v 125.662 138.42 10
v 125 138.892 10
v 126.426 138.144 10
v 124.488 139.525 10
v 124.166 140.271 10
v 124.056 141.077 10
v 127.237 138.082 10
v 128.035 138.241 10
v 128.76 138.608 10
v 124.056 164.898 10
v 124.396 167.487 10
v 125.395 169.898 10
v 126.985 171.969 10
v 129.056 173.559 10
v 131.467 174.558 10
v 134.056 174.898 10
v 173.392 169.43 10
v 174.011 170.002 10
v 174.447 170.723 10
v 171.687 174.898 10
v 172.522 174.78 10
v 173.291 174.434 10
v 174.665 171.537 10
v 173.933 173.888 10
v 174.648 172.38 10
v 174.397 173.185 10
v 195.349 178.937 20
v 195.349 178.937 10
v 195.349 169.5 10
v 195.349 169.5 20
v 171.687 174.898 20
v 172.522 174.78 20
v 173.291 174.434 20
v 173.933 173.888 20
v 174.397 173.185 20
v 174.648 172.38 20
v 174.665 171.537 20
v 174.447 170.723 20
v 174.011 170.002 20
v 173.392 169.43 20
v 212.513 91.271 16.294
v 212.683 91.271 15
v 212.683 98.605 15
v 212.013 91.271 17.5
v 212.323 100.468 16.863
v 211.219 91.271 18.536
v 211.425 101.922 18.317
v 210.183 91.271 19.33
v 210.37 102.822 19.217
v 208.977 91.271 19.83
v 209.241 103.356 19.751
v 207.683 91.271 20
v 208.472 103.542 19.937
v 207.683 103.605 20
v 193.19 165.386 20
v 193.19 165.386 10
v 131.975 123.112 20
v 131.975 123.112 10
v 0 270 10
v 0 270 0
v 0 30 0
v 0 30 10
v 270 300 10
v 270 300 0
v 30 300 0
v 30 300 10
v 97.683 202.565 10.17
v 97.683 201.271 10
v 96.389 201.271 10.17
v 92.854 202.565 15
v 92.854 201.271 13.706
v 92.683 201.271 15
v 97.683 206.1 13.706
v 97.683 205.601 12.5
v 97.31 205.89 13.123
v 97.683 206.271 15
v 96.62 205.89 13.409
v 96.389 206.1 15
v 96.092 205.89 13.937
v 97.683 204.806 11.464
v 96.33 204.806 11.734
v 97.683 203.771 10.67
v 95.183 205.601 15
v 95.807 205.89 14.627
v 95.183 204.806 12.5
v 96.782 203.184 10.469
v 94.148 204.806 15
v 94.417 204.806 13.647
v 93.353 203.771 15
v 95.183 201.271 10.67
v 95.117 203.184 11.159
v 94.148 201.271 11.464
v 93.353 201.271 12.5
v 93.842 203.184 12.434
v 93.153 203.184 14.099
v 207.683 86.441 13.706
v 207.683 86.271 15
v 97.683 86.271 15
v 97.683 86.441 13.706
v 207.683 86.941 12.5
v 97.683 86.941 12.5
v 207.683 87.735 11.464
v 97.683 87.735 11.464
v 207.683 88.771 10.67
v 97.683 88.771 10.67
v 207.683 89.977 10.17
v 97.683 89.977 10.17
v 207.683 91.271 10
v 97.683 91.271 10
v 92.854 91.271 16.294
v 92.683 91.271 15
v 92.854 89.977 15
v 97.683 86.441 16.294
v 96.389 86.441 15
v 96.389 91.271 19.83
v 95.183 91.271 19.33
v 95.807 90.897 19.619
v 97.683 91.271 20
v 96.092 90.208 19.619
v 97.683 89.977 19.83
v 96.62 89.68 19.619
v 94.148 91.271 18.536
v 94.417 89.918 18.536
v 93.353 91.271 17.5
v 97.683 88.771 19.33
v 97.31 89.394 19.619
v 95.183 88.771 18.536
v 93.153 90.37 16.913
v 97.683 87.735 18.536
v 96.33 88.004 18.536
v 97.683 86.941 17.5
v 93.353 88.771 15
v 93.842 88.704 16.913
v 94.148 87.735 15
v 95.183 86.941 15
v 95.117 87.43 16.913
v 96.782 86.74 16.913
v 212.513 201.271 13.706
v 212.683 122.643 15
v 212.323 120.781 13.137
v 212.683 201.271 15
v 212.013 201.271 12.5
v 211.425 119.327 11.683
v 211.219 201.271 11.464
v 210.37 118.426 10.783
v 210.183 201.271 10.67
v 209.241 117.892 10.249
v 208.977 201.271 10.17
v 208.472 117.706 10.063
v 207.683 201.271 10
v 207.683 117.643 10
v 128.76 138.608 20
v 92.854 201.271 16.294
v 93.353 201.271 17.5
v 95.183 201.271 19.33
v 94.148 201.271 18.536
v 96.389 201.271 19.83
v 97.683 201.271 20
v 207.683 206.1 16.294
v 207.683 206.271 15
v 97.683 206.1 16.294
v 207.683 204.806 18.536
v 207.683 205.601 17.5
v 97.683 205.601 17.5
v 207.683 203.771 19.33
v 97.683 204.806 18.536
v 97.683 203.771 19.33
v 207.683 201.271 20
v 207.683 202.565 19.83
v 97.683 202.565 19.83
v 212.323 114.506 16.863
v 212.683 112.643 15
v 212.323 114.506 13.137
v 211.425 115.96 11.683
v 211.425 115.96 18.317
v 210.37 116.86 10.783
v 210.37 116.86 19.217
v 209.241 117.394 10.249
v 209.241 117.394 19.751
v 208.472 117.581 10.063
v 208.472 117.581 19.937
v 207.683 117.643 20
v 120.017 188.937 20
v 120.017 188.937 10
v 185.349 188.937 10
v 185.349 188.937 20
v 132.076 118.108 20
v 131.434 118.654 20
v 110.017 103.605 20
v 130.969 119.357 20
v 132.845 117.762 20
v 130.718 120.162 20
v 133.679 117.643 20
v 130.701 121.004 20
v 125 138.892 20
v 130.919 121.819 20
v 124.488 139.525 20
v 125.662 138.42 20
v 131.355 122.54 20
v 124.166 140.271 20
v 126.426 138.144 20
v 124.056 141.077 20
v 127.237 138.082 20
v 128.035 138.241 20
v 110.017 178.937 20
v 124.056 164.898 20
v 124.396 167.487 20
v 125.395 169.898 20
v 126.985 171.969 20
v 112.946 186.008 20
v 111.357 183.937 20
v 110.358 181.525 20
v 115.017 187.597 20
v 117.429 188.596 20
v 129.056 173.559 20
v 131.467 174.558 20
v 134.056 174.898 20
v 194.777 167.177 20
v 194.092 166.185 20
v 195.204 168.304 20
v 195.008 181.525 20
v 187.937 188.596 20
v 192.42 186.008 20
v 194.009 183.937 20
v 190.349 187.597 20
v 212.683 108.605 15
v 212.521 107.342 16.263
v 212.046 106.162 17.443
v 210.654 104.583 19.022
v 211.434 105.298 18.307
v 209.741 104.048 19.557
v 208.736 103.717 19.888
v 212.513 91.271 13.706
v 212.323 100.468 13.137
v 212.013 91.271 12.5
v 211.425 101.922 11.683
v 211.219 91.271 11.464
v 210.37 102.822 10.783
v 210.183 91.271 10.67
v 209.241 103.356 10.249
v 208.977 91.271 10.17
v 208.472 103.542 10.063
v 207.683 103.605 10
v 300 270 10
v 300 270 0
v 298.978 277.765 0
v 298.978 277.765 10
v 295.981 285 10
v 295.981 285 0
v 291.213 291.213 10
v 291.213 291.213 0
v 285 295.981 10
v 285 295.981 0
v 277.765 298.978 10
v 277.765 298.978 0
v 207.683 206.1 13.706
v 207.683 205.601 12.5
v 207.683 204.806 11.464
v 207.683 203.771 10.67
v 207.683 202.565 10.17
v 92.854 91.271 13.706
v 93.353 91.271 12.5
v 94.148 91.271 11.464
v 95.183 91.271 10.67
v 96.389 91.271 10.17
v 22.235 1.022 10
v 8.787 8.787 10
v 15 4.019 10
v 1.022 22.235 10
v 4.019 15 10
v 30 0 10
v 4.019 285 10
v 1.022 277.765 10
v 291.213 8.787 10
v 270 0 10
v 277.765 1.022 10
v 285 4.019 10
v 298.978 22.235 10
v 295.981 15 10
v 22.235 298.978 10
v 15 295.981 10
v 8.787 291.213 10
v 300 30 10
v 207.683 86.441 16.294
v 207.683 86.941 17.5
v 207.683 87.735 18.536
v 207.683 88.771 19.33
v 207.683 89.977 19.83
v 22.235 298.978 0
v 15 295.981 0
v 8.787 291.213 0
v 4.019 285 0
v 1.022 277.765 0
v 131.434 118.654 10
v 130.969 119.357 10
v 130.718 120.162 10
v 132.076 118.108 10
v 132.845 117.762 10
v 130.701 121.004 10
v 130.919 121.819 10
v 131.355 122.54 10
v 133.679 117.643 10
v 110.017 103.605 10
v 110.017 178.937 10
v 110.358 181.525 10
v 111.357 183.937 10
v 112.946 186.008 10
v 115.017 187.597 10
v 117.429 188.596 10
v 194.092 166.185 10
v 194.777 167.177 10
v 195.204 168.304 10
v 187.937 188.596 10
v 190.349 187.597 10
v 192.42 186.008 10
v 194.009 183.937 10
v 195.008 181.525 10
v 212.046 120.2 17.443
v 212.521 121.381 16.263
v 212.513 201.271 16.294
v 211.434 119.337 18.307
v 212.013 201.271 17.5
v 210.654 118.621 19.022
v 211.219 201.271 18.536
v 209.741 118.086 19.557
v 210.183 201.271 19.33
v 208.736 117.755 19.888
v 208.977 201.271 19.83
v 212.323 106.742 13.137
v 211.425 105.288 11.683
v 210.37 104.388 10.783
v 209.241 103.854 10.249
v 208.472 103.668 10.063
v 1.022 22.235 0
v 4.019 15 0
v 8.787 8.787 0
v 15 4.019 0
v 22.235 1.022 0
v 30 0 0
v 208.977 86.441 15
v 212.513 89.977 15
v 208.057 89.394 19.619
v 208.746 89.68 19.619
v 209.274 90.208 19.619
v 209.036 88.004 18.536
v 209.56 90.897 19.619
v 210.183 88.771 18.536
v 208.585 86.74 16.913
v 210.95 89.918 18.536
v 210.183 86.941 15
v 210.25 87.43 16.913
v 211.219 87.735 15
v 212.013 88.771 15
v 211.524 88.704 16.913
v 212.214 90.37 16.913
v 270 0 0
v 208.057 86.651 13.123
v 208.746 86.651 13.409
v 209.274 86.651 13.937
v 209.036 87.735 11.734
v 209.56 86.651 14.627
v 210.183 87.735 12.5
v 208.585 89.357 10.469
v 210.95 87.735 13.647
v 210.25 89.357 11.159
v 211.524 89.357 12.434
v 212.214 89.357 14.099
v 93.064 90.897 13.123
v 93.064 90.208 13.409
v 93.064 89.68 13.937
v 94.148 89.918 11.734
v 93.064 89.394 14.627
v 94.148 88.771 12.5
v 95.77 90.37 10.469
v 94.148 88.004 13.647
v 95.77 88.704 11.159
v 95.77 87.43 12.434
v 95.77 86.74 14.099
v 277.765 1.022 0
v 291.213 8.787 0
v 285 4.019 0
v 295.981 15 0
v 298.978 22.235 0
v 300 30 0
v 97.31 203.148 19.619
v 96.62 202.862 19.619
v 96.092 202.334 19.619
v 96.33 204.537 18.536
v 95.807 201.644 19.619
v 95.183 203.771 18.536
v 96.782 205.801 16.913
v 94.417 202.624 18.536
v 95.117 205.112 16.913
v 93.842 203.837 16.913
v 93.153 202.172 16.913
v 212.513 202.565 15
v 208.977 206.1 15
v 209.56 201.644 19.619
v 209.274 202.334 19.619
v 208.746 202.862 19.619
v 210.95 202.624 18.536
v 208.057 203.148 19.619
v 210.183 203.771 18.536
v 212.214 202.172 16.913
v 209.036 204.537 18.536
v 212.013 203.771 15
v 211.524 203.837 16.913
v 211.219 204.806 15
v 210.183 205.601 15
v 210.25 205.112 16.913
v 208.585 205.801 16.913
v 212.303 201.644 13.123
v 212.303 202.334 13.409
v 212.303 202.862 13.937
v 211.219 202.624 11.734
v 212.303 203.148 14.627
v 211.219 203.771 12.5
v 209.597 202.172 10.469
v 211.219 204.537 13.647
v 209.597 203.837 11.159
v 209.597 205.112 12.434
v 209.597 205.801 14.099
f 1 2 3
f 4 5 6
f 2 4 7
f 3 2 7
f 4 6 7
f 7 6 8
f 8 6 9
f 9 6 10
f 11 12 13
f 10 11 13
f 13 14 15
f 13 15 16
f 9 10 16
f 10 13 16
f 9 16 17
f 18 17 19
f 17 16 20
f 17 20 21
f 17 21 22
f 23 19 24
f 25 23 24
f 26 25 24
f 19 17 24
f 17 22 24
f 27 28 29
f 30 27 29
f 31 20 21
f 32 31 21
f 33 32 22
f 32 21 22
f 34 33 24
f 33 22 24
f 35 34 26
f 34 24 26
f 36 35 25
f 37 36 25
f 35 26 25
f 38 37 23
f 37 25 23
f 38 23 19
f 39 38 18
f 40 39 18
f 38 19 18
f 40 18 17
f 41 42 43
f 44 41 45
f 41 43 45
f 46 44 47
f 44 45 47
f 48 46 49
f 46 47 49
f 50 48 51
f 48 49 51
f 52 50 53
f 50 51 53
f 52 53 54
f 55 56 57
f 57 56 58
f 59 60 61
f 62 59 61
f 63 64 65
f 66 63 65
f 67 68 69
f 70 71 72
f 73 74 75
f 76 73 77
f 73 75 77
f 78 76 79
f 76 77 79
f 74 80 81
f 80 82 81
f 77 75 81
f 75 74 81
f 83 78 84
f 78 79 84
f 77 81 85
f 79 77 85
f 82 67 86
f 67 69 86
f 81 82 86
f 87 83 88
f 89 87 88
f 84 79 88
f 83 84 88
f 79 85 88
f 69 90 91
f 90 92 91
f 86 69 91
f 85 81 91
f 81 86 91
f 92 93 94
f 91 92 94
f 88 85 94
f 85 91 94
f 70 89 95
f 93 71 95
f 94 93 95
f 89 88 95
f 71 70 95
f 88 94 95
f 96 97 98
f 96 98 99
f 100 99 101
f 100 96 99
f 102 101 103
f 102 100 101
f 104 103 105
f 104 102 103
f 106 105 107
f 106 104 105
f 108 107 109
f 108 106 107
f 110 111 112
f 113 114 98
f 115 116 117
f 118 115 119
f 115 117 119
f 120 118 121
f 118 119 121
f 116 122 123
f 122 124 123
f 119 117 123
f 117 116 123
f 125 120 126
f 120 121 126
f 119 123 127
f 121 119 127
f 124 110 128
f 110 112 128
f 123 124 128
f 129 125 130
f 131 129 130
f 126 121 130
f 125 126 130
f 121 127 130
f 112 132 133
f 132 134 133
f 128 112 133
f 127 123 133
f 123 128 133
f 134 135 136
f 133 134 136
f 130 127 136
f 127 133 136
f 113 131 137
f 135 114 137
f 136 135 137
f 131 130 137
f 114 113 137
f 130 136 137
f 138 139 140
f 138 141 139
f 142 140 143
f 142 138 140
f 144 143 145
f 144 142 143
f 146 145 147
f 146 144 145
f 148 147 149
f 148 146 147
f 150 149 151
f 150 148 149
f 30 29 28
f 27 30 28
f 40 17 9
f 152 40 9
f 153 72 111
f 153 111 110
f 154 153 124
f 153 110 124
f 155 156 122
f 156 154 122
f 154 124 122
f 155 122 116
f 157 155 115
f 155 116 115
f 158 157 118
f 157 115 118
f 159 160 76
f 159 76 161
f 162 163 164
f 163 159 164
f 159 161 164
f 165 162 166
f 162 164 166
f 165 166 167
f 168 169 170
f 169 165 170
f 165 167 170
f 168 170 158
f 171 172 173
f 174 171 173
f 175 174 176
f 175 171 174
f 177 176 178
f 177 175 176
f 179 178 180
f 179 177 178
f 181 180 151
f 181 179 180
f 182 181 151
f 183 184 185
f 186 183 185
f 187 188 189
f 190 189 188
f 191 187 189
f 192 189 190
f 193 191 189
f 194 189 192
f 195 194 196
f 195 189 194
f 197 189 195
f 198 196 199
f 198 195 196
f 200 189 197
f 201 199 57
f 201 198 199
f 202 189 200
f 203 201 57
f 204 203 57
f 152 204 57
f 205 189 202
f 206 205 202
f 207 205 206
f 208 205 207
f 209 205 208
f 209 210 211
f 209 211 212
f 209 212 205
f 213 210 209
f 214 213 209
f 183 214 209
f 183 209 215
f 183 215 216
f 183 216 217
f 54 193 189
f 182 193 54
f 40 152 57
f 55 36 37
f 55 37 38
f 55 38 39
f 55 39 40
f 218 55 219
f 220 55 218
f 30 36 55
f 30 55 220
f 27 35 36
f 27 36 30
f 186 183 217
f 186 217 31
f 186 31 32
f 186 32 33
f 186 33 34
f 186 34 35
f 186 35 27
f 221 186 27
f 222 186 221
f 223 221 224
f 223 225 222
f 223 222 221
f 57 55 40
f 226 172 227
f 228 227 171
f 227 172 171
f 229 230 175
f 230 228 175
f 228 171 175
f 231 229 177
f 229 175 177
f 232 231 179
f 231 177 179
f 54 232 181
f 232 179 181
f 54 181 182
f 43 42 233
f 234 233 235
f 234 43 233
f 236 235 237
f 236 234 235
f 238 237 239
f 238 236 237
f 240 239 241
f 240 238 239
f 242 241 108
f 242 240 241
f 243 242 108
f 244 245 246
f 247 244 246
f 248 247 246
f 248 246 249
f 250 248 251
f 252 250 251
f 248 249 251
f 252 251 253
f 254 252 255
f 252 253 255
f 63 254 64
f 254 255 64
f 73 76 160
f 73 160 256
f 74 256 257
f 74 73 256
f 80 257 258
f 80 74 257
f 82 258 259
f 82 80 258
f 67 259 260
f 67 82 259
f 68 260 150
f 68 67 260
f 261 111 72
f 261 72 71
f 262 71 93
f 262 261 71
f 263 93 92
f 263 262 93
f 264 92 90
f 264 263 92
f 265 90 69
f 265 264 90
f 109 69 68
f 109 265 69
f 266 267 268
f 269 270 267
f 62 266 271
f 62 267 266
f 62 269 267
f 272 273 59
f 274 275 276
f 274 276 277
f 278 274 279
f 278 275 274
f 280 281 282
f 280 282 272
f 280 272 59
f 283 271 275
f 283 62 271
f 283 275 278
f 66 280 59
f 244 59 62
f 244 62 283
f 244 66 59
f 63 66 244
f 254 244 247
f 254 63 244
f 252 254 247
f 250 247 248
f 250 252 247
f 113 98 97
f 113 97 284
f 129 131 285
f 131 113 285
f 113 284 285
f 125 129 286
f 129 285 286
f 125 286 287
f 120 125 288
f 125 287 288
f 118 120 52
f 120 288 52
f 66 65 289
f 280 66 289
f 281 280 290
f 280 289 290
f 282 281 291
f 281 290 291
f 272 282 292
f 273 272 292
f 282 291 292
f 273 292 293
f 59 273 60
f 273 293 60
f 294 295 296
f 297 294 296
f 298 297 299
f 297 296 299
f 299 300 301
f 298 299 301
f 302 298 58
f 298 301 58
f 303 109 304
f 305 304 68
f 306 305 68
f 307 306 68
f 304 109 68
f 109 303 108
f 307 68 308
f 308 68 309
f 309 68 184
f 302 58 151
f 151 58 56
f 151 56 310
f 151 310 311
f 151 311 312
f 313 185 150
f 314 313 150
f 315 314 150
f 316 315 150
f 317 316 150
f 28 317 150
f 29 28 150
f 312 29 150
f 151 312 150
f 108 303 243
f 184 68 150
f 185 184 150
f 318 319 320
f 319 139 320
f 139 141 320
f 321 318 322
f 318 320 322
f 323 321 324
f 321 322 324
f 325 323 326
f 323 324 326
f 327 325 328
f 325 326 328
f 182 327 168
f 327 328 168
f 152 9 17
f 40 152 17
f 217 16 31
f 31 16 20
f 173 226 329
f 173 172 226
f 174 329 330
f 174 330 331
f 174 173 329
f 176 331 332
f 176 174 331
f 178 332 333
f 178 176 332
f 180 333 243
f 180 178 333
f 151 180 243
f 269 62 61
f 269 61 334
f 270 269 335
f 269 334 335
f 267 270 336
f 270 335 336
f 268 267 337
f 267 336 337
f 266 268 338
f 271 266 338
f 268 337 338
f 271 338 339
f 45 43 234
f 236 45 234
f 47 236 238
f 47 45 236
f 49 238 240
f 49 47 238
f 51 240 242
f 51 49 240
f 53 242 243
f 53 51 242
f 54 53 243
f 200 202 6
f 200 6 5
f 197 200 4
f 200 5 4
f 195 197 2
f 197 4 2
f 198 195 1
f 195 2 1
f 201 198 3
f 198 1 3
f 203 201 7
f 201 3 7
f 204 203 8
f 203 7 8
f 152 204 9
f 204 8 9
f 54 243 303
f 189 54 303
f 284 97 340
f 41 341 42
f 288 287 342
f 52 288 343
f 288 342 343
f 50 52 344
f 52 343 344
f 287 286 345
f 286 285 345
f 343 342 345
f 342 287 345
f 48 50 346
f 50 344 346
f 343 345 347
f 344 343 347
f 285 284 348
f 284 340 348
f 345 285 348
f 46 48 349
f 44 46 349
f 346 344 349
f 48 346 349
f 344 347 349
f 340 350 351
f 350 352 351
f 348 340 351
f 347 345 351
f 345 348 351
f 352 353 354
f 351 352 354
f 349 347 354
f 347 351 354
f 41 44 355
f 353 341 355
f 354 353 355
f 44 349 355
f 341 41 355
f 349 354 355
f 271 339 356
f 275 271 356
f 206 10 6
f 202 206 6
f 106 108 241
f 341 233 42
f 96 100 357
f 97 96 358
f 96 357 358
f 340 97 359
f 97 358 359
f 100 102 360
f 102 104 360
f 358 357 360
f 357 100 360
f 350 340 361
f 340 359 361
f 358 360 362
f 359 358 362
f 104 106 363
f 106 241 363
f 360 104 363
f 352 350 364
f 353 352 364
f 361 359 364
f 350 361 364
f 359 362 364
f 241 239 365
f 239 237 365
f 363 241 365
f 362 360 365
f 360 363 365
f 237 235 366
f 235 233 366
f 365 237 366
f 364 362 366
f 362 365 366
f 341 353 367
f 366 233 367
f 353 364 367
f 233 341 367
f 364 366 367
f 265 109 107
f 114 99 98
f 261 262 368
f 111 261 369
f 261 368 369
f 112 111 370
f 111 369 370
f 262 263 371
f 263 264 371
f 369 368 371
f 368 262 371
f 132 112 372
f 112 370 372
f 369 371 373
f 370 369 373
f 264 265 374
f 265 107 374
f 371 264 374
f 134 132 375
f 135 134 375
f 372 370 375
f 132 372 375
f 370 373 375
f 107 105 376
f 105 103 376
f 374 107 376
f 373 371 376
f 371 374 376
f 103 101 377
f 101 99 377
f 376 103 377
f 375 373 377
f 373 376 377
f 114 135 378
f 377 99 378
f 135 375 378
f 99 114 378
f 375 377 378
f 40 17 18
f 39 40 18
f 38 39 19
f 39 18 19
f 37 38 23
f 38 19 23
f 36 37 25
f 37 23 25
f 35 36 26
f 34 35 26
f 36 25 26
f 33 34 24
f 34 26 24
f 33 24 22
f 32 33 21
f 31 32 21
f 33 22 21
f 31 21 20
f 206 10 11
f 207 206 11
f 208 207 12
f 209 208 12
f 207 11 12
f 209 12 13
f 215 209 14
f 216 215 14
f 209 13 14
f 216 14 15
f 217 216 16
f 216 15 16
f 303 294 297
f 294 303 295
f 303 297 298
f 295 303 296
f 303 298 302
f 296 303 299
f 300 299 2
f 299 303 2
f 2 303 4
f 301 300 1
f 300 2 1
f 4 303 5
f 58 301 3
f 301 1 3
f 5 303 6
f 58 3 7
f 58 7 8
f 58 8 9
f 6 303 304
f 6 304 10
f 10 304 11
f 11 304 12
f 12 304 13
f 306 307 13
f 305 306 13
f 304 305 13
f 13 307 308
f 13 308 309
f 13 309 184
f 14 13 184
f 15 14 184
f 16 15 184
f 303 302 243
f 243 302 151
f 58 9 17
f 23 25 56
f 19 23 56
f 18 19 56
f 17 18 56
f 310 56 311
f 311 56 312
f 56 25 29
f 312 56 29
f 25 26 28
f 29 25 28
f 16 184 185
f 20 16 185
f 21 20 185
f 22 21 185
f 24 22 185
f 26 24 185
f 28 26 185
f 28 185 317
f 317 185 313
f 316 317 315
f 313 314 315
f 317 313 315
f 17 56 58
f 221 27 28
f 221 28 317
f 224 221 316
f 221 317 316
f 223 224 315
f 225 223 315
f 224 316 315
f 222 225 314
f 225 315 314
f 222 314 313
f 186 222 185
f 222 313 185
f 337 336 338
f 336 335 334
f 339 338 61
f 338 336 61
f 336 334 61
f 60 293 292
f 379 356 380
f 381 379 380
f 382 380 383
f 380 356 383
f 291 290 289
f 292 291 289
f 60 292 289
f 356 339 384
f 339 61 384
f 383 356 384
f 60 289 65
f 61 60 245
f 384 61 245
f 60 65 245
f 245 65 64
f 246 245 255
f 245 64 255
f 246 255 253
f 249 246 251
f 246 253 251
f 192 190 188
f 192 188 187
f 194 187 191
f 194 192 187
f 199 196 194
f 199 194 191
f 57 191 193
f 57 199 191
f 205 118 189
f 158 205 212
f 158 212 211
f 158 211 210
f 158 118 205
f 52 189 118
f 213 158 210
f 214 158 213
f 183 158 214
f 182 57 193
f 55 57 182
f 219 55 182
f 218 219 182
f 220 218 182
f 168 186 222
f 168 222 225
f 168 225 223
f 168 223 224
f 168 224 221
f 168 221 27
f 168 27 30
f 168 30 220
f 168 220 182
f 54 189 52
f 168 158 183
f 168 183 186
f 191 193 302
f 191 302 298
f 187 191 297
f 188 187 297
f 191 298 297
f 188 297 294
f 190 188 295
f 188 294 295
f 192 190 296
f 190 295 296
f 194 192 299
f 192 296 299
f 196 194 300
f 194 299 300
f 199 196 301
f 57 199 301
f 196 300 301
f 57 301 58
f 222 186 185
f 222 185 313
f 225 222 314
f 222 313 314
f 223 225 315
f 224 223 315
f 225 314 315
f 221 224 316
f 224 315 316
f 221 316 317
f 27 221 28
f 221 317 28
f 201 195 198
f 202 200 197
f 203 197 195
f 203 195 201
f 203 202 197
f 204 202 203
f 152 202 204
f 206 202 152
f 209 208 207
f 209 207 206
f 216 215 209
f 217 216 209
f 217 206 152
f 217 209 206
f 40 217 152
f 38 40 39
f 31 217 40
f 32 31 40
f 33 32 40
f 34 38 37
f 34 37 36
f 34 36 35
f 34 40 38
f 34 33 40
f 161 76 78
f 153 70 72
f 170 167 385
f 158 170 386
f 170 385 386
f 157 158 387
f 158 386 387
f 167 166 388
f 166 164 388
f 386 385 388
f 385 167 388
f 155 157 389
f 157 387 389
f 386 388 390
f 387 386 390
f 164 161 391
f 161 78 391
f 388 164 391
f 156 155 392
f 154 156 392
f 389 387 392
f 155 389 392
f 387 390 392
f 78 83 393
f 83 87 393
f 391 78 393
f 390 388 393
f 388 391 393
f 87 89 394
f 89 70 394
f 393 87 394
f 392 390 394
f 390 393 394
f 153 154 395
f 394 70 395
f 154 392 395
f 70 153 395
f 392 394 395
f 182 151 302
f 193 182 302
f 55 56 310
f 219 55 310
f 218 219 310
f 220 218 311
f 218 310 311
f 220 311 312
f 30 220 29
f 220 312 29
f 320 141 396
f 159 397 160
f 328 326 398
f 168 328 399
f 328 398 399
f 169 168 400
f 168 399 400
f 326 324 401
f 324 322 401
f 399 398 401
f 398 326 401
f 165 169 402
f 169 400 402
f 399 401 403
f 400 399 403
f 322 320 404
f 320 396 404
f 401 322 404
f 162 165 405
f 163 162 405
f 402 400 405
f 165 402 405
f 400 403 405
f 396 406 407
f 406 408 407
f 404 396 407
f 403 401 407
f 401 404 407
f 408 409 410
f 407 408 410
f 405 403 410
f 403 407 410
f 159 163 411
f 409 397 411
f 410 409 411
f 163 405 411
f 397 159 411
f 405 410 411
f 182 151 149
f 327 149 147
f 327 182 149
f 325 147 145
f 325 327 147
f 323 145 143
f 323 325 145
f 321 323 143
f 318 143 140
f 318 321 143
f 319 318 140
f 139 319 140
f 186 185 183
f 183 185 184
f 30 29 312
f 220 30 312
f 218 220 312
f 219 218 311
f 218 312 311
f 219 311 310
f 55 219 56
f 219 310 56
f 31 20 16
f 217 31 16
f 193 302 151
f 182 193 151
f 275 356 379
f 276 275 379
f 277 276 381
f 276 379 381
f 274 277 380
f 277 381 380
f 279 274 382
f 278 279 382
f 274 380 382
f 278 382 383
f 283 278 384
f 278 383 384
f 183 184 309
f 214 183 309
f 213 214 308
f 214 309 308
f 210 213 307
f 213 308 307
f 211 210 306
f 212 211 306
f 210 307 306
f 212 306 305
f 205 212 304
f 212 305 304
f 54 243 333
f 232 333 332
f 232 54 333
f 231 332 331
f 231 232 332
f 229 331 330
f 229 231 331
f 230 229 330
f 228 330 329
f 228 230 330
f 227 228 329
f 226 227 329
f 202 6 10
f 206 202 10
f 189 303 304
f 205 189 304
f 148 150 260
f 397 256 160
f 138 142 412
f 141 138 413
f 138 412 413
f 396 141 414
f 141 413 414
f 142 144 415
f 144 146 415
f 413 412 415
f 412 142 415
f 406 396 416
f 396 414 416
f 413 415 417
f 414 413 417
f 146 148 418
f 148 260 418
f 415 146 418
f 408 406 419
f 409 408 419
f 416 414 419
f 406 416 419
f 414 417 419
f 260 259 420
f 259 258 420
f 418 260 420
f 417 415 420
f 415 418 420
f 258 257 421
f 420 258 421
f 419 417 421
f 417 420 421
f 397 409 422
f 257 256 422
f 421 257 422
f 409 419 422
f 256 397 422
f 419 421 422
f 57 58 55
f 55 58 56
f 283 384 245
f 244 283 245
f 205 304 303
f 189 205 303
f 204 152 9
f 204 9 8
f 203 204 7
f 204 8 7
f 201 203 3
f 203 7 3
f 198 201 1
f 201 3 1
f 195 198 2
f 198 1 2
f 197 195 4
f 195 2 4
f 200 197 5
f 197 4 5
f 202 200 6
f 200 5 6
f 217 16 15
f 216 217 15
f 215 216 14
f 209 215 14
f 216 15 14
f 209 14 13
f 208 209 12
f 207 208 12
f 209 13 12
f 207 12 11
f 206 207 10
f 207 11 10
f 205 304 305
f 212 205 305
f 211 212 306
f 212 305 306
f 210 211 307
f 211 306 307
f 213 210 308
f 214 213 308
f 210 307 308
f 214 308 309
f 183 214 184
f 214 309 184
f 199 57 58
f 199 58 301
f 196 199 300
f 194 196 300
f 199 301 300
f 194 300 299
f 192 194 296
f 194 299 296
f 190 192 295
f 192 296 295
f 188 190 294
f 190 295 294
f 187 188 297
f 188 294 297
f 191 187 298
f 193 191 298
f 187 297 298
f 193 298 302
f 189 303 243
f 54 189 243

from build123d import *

# Parameters (mm, degrees)
BOSS_EXTRUDE1_DEPTH   = 10
BOSS_EXTRUDE2_DEPTH   = 10
BOSS_EXTRUDE2_2_DEPTH = 10
BOSS_EXTRUDE3_DEPTH   = 10
FILLET1_R             = 5
FILLET2_R             = 5


with BuildPart() as part:
    # Sketch1 → Boss-Extrude1 (new body)
    with BuildSketch(Plane.XY):
        with BuildLine():
            Line((30, 0), (270, 0))
            ThreePointArc((270, 0), (291.213203436, 8.786796564), (300, 30))
            Line((300, 30), (300, 270))
            ThreePointArc((300, 270), (291.213203436, 291.213203436), (270, 300))
            Line((270, 300), (30, 300))
            ThreePointArc((30, 300), (8.786796564, 291.213203436), (0, 270))
            Line((0, 270), (0, 30))
            ThreePointArc((0, 30), (8.786796564, 8.786796564), (30, 0))
        make_face()
    extrude(amount=BOSS_EXTRUDE1_DEPTH)


with BuildPart() as body_2:
    # Sketch2 → Boss-Extrude2 (new body)
    with BuildSketch(Plane.XY.offset(10)):
        with BuildLine():
            Line((212.683257667, 86.270816378), (212.683257667, 103.605002094))
            Line((212.683257667, 103.605002094), (110.017443383, 103.605002094))
            Line((110.017443383, 103.605002094), (110.017443383, 178.936630662))
            ThreePointArc((110.017443383, 178.936630662), (112.946375571, 186.007698474), (120.017443383, 188.936630662))
            Line((120.017443383, 188.936630662), (185.349071951, 188.936630662))
            ThreePointArc((185.349071951, 188.936630662), (192.420139763, 186.007698474), (195.349071951, 178.936630662))
            Line((195.349071951, 178.936630662), (195.349071951, 169.500355881))
            ThreePointArc((195.349071951, 169.500355881), (194.776609718, 167.177230977), (193.190308222, 165.38606658))
            Line((193.190308222, 165.38606658), (131.974513591, 123.111806467))
            ThreePointArc((131.974513591, 123.111806467), (130.815191742, 119.750406123), (133.679255354, 117.643232887))
            Line((133.679255354, 117.643232887), (212.683257667, 117.643232887))
            Line((212.683257667, 117.643232887), (212.683257667, 206.270816378))
            Line((212.683257667, 206.270816378), (92.683257667, 206.270816378))
            Line((92.683257667, 206.270816378), (92.683257667, 86.270816378))
            Line((92.683257667, 86.270816378), (212.683257667, 86.270816378))
        make_face()
    extrude(amount=BOSS_EXTRUDE2_DEPTH)

    # Fillet1
    fillet1_edges = [body_2.edges().sort_by_distance(p)[0] for p in [
        (212.683257667, 94.937909236, 10),
        (152.683257667, 86.270816378, 10),
        (92.683257667, 146.270816378, 10),
        (152.683257667, 206.270816378, 10),
        (212.683257667, 161.957024632, 10),
        (212.683257667, 103.605002094, 15),
        (212.683257667, 86.270816378, 15),
        (92.683257667, 86.270816378, 15),
        (92.683257667, 206.270816378, 15),
        (212.683257667, 206.270816378, 15),
        (212.683257667, 117.643232887, 15),
        (212.683257667, 161.957024632, 20),
        (152.683257667, 206.270816378, 20),
        (92.683257667, 146.270816378, 20),
        (152.683257667, 86.270816378, 20),
        (212.683257667, 94.937909236, 20),
    ]]
    fillet(fillet1_edges, radius=FILLET1_R - 0.0001)  # a hair under: the kernel refuses the full size


with BuildPart() as body_3:
    # Sketch2 → Boss-Extrude2 2 (new body)
    with BuildSketch(Plane.XY.offset(10)):
        with BuildLine():
            Line((124.055674176, 164.898399869), (124.055674176, 141.076823854))
            ThreePointArc((124.055674176, 141.076823854), (125.661799233, 138.420301194), (128.760415939, 138.608250273))
            Line((128.760415939, 138.608250273), (173.392001743, 169.429826289))
            ThreePointArc((173.392001743, 169.429826289), (174.551323592, 172.791226633), (171.687259981, 174.898399869))
            Line((171.687259981, 174.898399869), (134.055674176, 174.898399869))
            ThreePointArc((134.055674176, 174.898399869), (126.984606364, 171.969467681), (124.055674176, 164.898399869))
        make_face()
    extrude(amount=BOSS_EXTRUDE2_2_DEPTH)


with BuildPart() as body_4:
    # Sketch2<3> → Boss-Extrude3 (new body)
    with BuildSketch(Plane.XY.offset(10)):
        with BuildLine():
            Line((110.017443383, 103.605002094), (212.683257667, 103.605002094))
            Line((212.683257667, 103.605002094), (212.683257667, 117.643232887))
            Line((212.683257667, 117.643232887), (133.679255354, 117.643232887))
            ThreePointArc((133.679255354, 117.643232887), (130.815191742, 119.750406123), (131.974513591, 123.111806467))
            Line((131.974513591, 123.111806467), (193.190308222, 165.38606658))
            ThreePointArc((193.190308222, 165.38606658), (194.776609718, 167.177230977), (195.349071951, 169.500355881))
            Line((195.349071951, 169.500355881), (195.349071951, 178.936630662))
            ThreePointArc((195.349071951, 178.936630662), (192.420139763, 186.007698474), (185.349071951, 188.936630662))
            Line((185.349071951, 188.936630662), (120.017443383, 188.936630662))
            ThreePointArc((120.017443383, 188.936630662), (112.946375571, 186.007698474), (110.017443383, 178.936630662))
            Line((110.017443383, 178.936630662), (110.017443383, 103.605002094))
        make_face()
        with BuildLine():
            ThreePointArc((128.760415939, 138.608250273), (125.661799233, 138.420301194), (124.055674176, 141.076823854))
            Line((124.055674176, 141.076823854), (124.055674176, 164.898399869))
            ThreePointArc((124.055674176, 164.898399869), (126.984606364, 171.969467681), (134.055674176, 174.898399869))
            Line((134.055674176, 174.898399869), (171.687259981, 174.898399869))
            ThreePointArc((171.687259981, 174.898399869), (174.551323592, 172.791226633), (173.392001743, 169.429826289))
            Line((173.392001743, 169.429826289), (128.760415939, 138.608250273))
        make_face(mode=Mode.SUBTRACT)
    extrude(amount=BOSS_EXTRUDE3_DEPTH)

    # Fillet2
    fillet2_edges = [body_4.edges().sort_by_distance(p)[0] for p in [
        (212.683257667, 110.62411749, 10),
        (212.683257667, 117.643232887, 15),
        (212.683257667, 103.605002094, 15),
        (212.683257667, 110.62411749, 20),
    ]]
    fillet(fillet2_edges, radius=FILLET2_R - 0.0001)  # a hair under: the kernel refuses the full size


solid = Compound([part.part, body_2.part, body_3.part, body_4.part])
